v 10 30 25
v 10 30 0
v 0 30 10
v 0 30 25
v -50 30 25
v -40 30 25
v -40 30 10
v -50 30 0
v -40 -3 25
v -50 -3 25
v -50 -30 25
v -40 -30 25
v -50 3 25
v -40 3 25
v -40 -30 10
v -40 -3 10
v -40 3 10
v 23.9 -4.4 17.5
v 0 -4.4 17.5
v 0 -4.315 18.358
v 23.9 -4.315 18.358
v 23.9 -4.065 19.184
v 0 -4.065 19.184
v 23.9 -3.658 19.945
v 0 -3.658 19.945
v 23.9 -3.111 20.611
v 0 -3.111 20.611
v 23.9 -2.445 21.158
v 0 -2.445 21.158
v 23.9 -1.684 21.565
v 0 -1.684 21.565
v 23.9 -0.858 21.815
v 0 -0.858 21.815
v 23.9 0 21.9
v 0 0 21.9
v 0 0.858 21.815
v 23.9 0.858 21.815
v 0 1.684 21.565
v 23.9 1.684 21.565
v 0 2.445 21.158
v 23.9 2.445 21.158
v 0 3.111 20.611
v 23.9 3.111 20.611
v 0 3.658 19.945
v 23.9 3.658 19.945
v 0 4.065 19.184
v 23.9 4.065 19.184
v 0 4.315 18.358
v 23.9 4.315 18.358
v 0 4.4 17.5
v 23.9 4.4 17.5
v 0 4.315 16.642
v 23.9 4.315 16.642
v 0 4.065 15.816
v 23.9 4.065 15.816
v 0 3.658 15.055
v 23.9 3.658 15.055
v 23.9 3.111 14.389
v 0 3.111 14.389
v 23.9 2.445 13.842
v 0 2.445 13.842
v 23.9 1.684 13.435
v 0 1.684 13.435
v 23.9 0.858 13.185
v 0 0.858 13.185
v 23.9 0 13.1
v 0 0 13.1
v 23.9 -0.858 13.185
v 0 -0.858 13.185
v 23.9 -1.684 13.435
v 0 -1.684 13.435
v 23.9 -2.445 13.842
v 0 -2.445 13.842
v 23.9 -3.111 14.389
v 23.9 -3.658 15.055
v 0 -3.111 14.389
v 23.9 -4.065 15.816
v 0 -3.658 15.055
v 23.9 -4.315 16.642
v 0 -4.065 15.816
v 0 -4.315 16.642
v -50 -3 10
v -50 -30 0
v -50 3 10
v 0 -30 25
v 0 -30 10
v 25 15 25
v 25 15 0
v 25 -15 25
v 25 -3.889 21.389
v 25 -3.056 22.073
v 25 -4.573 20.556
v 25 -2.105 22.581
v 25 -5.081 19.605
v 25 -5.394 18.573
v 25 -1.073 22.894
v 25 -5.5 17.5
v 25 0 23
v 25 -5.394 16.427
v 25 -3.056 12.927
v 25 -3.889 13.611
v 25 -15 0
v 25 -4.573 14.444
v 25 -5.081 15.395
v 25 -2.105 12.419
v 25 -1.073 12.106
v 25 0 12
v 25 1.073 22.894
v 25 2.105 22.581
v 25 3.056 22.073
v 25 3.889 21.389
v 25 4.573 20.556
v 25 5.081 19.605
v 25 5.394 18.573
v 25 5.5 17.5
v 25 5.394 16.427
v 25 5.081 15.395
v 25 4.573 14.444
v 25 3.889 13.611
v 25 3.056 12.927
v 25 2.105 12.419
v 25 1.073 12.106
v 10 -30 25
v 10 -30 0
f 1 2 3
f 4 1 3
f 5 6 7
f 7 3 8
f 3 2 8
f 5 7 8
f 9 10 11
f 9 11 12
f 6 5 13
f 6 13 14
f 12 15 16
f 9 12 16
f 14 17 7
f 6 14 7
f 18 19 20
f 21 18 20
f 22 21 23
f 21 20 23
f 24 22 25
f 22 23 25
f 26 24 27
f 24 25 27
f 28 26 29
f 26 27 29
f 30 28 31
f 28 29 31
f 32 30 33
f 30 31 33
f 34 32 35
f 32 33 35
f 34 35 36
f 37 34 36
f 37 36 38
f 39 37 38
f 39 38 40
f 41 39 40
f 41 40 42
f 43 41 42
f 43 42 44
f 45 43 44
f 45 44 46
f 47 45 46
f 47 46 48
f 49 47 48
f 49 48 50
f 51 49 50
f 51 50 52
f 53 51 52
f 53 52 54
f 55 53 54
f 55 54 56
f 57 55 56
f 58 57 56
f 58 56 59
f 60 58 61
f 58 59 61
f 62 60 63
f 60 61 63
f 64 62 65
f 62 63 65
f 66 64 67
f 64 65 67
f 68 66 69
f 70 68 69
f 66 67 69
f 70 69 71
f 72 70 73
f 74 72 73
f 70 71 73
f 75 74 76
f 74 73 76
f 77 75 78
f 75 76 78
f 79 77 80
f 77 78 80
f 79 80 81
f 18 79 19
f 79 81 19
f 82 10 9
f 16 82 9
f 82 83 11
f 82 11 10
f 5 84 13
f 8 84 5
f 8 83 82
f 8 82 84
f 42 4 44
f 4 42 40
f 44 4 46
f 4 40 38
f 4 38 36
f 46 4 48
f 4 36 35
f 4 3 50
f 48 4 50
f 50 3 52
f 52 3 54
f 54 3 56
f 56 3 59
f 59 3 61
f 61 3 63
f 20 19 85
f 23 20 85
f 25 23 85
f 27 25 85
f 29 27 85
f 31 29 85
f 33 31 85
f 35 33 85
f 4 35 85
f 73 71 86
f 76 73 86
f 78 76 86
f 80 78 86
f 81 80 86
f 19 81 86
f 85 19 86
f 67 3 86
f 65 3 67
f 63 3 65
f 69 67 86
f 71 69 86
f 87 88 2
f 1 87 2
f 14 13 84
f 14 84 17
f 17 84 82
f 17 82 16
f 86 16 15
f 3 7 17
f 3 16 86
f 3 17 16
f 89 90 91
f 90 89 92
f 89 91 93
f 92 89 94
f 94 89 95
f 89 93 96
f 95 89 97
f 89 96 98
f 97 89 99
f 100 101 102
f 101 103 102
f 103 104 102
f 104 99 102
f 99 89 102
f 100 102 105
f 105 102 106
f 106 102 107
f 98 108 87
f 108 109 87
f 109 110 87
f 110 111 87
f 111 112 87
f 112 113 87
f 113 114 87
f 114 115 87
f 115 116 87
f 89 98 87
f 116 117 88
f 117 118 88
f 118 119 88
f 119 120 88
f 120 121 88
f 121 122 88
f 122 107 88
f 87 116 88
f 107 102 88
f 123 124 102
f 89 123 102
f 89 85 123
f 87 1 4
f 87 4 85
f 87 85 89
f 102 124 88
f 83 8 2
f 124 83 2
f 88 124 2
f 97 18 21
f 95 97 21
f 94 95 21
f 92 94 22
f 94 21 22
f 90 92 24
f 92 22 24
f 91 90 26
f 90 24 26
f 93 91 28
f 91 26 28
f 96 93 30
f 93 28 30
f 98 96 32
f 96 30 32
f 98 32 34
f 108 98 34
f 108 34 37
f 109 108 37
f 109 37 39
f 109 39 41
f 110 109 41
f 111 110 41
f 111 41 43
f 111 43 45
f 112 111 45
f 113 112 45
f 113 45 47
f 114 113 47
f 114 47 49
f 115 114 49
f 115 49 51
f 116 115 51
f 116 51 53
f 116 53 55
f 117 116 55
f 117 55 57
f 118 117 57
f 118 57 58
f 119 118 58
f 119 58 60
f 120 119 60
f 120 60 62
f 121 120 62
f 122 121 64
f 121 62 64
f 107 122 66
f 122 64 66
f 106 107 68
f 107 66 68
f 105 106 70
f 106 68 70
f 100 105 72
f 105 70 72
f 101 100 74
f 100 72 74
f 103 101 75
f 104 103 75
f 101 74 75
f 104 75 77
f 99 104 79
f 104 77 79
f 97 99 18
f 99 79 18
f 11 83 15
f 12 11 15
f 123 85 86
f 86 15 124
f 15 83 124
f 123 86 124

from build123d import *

# Parameters (mm, degrees)
F7_W           = 10
F7_H           = 60
F7_W_2         = 40
F0_DEPTH       = 10
F1_DEPTH       = 25
F2_W           = 10
F2_H           = 6
F3_DEPTH       = 15
F6_D           = 8.8
F6_DEPTH       = 25
F6_CSINK_D     = 11
F6_CSINK_ANGLE = 90


with BuildPart() as f0:
    # F7 (on Top) → F0 (new body)
    with BuildSketch(Plane.XY):
        with Locations((-45, 0)):
            Rectangle(F7_W, F7_H)
        Polygon((10, 30), (0, 30), (0, -30), (10, -30), (25, -15), (25, 15), align=None)
        with Locations((-20, 0)):
            Rectangle(F7_W_2, F7_H)
    extrude(amount=F0_DEPTH)

    # F7 (on Top) → F1 (join)
    with BuildSketch(Plane.XY):
        with Locations((-45, 0)):
            Rectangle(F7_W, F7_H)
        Polygon((10, 30), (0, 30), (0, -30), (10, -30), (25, -15), (25, 15), align=None)
    extrude(amount=F1_DEPTH)

    # F2 (on face) → F3 (cut)
    with BuildSketch(Plane.XY.offset(25)):
        with Locations((-45, 0)):
            Rectangle(F2_W, F2_H)
    extrude(amount=-F3_DEPTH, mode=Mode.SUBTRACT)

    # F6
    with Locations(Plane.YZ.offset(25)):
        with Locations((0, 17.5)):
            CounterSinkHole(F6_D / 2, F6_CSINK_D / 2, depth=F6_DEPTH, counter_sink_angle=F6_CSINK_ANGLE)


solid = f0.part
